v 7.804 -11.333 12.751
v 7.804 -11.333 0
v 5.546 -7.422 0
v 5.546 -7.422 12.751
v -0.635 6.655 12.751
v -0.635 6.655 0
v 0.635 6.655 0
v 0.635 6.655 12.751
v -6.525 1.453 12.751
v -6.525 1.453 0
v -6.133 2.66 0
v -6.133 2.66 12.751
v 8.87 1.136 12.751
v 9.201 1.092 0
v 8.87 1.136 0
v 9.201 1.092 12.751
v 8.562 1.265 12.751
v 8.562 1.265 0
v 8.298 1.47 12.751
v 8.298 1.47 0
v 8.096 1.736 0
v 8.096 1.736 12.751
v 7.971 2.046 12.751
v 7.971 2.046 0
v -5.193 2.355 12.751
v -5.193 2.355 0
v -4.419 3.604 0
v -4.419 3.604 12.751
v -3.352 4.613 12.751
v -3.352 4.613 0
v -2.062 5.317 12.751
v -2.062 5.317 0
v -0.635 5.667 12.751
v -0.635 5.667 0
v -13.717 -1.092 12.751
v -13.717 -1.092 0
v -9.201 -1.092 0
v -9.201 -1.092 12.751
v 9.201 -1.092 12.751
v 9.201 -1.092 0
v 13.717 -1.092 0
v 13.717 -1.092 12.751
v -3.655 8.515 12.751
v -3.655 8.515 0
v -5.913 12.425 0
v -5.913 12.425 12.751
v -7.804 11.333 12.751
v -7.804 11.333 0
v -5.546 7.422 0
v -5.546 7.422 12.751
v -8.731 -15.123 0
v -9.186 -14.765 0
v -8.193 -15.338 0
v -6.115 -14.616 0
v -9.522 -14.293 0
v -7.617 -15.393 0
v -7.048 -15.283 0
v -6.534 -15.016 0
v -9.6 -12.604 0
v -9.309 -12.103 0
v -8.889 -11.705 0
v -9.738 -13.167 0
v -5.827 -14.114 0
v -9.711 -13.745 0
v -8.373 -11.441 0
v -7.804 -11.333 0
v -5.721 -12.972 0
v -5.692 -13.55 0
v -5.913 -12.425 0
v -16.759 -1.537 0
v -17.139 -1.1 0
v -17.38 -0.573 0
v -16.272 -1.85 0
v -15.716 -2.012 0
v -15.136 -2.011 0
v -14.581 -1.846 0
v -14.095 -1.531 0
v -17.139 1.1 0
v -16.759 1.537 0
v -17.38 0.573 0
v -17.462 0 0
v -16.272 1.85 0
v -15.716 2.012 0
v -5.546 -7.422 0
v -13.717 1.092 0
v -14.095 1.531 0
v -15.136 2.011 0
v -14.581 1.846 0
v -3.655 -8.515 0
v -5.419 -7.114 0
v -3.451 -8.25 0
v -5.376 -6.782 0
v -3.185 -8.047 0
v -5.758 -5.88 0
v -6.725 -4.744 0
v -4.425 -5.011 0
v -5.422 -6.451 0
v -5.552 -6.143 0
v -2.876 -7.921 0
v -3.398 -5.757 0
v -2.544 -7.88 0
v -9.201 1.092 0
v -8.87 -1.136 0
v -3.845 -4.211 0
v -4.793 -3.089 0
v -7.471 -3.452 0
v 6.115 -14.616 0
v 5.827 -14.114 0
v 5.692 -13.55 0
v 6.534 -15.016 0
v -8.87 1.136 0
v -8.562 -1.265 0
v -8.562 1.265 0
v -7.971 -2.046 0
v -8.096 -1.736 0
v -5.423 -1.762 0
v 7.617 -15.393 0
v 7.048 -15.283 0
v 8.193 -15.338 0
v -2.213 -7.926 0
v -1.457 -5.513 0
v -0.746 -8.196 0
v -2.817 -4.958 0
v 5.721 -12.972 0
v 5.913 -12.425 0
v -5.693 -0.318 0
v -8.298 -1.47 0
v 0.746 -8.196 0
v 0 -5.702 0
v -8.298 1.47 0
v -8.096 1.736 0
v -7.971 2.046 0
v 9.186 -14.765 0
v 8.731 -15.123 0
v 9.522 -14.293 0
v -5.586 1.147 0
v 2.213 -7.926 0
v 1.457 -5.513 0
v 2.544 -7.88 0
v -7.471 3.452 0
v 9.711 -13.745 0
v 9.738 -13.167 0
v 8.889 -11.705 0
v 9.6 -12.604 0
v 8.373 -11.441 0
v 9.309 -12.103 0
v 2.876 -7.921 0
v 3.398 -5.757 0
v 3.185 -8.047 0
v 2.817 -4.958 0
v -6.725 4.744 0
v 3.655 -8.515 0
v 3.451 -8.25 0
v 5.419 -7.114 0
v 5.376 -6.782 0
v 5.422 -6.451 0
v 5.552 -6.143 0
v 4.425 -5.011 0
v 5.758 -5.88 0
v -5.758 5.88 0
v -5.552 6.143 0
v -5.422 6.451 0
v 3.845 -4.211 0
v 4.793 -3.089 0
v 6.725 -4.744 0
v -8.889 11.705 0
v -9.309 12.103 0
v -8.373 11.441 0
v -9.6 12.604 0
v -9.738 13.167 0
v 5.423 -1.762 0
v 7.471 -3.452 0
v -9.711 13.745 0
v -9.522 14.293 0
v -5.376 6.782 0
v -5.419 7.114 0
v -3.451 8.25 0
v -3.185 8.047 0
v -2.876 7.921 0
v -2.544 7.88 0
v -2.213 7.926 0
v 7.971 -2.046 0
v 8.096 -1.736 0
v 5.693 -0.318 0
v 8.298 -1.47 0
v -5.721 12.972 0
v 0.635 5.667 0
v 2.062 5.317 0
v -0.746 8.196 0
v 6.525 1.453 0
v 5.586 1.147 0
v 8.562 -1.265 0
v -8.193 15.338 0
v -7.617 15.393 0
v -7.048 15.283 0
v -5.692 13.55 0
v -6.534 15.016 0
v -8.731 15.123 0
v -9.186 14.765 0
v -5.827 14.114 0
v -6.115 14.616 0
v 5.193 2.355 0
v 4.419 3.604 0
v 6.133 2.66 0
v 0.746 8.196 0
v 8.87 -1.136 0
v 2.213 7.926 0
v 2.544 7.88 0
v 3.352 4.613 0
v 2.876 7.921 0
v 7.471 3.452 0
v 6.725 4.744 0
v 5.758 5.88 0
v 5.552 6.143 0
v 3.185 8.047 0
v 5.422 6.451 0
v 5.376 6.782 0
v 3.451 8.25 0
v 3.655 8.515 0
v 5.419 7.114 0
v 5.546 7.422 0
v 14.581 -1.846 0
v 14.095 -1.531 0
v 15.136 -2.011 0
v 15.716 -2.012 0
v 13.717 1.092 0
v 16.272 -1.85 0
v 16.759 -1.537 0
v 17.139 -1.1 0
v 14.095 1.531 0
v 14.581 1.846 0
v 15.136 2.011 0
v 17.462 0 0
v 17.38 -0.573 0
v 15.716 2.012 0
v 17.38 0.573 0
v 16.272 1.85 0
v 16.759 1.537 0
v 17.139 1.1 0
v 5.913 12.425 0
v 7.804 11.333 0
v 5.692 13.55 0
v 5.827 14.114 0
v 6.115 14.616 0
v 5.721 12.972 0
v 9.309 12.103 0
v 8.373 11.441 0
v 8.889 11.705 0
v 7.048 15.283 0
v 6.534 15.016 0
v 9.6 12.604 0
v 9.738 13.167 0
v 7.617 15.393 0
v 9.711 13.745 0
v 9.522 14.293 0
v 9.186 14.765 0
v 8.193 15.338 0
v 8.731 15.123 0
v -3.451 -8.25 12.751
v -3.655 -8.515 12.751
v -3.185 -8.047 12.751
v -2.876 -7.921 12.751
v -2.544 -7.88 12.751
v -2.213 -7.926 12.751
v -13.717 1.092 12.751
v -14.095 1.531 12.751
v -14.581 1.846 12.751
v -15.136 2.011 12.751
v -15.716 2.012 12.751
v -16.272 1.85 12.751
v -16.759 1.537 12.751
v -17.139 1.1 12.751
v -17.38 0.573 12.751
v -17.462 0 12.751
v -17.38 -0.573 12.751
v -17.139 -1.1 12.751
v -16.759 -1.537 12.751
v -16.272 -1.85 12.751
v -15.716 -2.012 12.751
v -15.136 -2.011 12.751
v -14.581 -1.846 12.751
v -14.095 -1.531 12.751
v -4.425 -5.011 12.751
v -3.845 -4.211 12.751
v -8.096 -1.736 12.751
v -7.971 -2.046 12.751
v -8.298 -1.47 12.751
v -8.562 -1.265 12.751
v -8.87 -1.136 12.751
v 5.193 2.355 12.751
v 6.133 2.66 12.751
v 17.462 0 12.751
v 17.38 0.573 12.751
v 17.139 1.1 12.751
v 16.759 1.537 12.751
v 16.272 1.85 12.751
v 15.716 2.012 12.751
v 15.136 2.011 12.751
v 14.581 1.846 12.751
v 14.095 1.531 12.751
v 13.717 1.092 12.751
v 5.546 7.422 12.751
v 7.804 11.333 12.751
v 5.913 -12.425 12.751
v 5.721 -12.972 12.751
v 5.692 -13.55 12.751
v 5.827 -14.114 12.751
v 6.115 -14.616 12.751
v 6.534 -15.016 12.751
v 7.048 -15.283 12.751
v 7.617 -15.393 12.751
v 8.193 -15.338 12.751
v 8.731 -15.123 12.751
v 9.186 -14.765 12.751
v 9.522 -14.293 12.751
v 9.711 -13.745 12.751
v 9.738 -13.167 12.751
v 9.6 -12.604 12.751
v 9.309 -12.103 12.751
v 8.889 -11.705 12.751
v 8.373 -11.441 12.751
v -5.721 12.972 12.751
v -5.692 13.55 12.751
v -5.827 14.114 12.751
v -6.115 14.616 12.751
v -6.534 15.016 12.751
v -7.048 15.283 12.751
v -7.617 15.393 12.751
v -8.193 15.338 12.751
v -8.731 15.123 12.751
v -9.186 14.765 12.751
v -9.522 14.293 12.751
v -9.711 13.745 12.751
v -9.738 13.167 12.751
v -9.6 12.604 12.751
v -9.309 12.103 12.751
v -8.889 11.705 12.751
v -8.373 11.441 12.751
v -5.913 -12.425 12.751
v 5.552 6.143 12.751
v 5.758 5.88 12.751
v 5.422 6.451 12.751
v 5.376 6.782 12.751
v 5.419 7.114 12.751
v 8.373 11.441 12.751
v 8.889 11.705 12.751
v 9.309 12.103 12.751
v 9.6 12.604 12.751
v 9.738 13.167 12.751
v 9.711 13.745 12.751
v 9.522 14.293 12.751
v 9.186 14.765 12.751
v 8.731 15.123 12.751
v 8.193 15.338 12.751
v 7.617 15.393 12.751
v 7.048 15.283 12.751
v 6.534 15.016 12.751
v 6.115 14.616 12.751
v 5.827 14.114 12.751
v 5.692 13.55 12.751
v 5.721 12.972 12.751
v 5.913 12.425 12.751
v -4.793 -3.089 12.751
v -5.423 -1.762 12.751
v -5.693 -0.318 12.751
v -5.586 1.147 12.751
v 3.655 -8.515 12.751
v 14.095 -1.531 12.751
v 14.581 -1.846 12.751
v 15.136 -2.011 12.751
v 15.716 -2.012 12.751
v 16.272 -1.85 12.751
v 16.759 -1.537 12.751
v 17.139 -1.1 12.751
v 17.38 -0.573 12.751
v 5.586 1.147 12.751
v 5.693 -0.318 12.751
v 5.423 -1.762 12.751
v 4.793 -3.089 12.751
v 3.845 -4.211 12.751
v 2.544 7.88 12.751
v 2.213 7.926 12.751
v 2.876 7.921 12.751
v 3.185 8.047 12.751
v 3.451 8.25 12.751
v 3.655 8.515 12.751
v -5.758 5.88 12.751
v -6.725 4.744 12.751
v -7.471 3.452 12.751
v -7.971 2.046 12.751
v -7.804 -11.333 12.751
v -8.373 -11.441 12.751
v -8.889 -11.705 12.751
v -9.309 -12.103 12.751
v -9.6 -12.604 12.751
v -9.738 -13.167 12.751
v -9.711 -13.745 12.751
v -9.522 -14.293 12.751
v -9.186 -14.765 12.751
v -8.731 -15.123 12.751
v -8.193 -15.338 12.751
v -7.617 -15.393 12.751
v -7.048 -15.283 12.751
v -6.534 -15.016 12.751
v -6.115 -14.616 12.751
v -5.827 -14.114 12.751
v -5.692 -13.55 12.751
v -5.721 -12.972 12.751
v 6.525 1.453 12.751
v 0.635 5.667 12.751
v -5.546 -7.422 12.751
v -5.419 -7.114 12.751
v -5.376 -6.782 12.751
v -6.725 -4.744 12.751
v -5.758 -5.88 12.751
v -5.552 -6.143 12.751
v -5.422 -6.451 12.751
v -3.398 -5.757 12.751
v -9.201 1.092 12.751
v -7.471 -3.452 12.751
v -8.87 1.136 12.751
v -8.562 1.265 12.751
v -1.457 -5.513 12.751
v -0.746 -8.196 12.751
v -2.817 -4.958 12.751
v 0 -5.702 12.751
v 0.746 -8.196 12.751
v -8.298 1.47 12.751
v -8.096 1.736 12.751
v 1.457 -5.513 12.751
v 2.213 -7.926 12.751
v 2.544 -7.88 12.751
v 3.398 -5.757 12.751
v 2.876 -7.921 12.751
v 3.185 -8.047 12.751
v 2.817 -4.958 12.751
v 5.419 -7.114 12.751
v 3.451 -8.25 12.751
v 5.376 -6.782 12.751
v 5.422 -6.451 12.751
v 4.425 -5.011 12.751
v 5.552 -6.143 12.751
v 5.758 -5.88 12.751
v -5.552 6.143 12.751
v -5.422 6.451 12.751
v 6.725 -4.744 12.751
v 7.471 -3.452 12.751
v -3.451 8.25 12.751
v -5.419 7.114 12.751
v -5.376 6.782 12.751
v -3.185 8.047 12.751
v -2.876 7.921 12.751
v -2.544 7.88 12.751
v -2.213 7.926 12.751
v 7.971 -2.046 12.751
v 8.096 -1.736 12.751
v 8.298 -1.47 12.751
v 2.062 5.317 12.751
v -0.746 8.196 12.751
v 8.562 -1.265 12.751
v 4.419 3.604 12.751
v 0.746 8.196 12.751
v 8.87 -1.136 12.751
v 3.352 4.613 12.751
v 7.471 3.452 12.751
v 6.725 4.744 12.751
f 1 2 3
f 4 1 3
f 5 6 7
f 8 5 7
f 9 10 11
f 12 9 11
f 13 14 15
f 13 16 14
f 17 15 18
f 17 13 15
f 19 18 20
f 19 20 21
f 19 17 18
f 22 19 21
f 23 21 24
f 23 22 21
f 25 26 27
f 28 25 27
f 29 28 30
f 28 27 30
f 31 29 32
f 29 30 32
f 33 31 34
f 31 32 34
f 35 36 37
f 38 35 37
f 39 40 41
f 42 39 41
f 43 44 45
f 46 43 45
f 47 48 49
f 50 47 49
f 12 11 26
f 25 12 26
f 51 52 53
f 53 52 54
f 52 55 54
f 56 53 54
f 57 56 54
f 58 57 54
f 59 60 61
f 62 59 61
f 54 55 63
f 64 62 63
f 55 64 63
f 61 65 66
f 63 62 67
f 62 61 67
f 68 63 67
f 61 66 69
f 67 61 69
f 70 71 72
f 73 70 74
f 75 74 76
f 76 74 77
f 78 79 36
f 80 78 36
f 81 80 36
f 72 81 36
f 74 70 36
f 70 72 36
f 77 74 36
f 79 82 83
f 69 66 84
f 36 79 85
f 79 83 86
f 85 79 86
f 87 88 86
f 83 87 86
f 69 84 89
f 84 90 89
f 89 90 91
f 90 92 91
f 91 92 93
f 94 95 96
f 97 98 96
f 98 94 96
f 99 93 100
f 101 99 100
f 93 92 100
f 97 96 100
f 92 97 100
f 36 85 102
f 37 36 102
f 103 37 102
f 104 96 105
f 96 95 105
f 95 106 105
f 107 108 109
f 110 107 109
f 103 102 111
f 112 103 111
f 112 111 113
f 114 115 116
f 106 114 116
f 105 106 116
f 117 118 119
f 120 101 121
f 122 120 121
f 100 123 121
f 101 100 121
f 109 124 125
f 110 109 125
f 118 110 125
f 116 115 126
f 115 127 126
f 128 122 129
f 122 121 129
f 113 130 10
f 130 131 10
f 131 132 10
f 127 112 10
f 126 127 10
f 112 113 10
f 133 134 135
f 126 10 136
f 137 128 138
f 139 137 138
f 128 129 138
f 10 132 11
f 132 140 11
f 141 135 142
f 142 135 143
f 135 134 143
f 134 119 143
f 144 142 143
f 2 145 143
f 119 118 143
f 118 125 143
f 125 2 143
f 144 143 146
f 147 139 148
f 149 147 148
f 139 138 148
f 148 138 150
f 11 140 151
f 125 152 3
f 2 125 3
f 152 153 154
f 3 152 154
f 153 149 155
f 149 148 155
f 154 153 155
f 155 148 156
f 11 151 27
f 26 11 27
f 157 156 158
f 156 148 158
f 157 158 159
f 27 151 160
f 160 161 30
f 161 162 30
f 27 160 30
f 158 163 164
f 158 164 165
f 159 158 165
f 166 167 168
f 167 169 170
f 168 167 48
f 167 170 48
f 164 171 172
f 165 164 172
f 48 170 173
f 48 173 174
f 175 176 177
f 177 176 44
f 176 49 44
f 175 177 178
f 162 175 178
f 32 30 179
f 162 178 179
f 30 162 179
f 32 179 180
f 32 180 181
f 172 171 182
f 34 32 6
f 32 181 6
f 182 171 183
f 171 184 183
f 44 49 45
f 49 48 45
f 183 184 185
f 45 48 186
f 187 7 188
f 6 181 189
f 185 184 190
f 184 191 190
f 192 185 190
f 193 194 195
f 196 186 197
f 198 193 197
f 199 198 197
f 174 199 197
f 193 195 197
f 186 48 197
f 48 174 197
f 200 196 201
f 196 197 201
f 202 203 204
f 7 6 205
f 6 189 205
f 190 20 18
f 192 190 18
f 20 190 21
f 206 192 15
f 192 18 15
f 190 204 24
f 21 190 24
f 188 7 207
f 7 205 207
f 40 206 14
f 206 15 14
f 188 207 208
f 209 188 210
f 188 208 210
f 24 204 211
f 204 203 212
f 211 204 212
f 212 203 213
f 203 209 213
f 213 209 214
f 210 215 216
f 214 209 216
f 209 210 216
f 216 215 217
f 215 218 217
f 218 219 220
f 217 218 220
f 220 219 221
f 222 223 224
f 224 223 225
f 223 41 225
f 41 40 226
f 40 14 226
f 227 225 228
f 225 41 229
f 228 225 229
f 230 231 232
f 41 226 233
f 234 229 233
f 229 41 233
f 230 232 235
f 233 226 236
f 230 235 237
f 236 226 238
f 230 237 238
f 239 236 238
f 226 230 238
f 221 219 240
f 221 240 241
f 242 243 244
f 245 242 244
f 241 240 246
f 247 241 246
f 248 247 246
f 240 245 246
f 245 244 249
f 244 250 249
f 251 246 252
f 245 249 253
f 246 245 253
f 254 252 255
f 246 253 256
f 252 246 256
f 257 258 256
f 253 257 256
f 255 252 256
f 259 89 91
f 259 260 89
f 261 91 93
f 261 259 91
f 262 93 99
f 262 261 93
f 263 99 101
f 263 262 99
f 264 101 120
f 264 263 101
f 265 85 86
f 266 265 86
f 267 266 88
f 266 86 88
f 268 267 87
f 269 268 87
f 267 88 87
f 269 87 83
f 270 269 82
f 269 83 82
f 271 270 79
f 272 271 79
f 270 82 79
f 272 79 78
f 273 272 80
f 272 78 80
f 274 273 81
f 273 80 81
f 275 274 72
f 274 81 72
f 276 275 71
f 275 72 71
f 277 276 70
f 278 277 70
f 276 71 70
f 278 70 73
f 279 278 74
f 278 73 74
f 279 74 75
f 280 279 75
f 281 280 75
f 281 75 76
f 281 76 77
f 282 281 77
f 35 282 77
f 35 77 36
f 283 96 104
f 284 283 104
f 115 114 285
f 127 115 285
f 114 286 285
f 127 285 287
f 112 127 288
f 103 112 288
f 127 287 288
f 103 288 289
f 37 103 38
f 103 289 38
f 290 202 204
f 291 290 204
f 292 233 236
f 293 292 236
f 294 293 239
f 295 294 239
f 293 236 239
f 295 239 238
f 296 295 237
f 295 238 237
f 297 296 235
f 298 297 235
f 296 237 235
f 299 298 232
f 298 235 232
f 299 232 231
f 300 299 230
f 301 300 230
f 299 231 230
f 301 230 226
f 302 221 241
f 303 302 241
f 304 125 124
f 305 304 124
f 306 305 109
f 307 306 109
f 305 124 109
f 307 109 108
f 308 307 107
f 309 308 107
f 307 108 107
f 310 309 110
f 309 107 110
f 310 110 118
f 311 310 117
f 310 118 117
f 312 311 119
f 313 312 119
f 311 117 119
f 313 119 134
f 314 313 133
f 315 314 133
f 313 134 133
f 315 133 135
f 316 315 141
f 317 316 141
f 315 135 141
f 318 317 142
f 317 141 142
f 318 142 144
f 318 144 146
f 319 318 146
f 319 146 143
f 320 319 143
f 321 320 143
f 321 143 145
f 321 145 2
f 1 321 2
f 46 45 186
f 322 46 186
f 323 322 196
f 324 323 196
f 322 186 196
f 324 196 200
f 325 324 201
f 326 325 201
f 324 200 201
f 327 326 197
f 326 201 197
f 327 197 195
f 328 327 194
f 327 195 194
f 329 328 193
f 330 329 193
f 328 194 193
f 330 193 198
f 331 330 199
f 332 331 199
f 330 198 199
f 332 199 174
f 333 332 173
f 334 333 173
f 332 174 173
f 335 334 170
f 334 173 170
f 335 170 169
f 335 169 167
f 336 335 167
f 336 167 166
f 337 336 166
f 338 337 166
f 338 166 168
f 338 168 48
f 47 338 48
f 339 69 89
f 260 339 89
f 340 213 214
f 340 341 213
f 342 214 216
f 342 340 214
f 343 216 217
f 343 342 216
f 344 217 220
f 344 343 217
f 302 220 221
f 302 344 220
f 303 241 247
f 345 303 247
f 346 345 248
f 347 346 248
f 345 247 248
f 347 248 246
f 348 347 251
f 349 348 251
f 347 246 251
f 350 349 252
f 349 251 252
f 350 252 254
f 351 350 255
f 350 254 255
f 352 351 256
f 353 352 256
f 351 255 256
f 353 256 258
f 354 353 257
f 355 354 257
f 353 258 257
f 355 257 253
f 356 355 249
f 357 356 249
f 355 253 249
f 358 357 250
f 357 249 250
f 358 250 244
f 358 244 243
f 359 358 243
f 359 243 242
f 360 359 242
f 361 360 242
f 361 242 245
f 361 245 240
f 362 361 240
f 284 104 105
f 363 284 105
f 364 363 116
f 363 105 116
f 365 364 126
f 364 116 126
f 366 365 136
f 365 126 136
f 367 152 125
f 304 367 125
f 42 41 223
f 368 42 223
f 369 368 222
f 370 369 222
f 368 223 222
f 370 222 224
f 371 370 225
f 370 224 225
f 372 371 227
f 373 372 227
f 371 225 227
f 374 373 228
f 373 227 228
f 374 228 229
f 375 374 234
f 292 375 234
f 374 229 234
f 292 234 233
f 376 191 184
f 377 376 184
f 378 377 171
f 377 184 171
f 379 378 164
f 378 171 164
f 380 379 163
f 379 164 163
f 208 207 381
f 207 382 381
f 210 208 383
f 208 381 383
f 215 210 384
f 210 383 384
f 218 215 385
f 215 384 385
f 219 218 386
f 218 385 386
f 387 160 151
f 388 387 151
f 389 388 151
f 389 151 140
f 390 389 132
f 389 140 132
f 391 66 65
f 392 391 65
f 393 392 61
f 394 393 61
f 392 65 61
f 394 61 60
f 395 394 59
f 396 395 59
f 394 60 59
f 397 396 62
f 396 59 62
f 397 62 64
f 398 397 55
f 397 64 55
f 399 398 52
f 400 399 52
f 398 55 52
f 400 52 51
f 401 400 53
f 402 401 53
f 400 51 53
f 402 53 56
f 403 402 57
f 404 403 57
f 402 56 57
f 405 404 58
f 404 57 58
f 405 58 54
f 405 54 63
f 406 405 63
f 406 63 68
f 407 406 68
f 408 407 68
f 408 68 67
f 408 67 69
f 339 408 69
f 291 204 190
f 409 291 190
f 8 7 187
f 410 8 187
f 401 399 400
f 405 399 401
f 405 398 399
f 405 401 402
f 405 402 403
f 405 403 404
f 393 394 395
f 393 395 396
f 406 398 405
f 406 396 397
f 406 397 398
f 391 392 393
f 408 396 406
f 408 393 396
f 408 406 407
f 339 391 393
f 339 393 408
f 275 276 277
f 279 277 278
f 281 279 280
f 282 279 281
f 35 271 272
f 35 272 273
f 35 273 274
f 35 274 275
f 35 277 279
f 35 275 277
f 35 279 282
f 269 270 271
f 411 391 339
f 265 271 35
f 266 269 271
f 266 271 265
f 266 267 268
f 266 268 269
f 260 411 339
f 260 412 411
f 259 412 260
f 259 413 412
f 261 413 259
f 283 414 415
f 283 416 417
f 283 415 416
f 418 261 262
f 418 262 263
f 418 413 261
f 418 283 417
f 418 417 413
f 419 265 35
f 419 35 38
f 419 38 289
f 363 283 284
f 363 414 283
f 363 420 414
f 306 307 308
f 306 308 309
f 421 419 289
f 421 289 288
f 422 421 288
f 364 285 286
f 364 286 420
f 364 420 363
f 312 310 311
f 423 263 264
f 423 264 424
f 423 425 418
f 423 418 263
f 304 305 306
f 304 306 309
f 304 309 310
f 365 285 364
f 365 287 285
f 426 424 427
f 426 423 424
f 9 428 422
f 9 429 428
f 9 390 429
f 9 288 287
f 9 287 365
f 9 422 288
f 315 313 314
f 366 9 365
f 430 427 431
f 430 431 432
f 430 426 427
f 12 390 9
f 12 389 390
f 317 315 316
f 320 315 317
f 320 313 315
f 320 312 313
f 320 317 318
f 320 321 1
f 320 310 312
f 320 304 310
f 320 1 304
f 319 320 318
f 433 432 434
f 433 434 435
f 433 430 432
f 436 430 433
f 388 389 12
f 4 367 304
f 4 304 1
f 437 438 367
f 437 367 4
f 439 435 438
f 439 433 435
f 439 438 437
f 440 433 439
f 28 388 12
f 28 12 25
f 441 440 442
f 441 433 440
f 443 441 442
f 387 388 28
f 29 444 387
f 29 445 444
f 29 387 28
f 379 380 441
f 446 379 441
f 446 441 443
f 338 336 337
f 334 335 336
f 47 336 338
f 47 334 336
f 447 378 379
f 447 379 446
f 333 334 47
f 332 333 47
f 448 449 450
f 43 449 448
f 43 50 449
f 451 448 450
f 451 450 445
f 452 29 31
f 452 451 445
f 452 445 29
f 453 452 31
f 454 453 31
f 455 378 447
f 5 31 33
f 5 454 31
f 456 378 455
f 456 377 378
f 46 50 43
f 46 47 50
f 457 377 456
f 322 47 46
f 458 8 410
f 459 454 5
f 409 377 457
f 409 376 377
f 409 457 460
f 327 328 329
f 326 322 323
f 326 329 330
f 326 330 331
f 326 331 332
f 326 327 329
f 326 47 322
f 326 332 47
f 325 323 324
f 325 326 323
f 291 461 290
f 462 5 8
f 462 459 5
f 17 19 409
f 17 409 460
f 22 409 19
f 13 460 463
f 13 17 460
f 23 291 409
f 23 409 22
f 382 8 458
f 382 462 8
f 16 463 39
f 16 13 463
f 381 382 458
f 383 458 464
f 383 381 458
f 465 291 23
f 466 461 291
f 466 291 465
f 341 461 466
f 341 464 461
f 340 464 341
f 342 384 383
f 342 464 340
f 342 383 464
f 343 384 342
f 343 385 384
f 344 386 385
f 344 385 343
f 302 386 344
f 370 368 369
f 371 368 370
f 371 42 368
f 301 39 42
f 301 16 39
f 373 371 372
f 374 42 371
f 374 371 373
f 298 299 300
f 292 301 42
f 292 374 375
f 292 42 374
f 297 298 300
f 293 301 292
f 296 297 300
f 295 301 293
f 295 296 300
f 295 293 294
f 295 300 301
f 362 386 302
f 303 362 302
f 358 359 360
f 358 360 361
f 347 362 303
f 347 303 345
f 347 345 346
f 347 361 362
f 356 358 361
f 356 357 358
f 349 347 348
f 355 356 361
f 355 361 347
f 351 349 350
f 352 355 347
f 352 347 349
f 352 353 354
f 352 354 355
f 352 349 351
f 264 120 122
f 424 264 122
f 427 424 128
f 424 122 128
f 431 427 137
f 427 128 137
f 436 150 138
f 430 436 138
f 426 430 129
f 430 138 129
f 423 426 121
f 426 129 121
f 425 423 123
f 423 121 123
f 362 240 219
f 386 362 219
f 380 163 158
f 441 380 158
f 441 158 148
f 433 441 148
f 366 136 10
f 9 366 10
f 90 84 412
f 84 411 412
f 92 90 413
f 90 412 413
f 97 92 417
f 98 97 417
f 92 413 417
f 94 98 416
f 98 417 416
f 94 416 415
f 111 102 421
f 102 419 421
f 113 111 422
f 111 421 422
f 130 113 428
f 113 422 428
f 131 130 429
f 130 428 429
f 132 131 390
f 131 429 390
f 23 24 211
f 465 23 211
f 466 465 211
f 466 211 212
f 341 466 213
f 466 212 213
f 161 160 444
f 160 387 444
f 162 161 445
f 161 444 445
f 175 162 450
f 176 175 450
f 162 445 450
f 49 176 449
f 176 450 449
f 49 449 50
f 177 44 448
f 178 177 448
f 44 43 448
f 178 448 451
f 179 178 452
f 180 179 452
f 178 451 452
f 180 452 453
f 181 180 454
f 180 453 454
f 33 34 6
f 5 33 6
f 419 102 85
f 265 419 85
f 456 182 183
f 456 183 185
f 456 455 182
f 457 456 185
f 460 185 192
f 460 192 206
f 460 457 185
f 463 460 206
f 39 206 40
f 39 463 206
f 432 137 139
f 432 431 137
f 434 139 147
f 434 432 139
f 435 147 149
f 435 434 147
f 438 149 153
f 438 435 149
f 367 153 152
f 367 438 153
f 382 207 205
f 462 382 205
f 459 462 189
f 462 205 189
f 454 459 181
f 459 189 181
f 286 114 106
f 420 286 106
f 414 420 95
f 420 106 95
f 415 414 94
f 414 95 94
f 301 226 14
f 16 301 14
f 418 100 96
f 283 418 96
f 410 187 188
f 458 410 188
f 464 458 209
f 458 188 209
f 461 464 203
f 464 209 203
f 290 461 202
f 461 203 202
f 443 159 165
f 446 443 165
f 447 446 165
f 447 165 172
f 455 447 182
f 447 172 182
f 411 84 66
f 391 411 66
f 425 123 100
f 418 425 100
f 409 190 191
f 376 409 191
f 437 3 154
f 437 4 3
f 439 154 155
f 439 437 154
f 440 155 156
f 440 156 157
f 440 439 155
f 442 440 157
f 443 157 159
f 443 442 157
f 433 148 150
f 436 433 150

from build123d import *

# Parameters (mm, degrees)
F1_DEPTH = 12.7508
F2_R     = 1.27


with BuildPart() as f1:
    # F0 (on Top) → F1 (new body)
    with BuildSketch(Plane.XY):
        with BuildLine():
            Line((-5.912621, -12.42536), (-3.132528, -7.610098))
            ThreePointArc((-3.132528, -7.610098), (0, -8.2296), (3.132528, -7.610098))
            Line((3.132528, -7.610098), (5.912621, -12.42536))
            ThreePointArc((5.912621, -12.42536), (8.73125, -15.122969), (7.804367, -11.33316))
            Line((7.804367, -11.33316), (5.024274, -6.517898))
            ThreePointArc((5.024274, -6.517898), (7.127043, -4.1148), (8.156802, -1.0922))
            Line((8.156802, -1.0922), (13.716988, -1.0922))
            ThreePointArc((13.716988, -1.0922), (15.999344, -1.950754), (17.4625, 0))
            ThreePointArc((17.4625, 0), (15.999344, 1.950754), (13.716988, 1.0922))
            Line((13.716988, 1.0922), (8.156802, 1.0922))
            ThreePointArc((8.156802, 1.0922), (7.127043, 4.1148), (5.024274, 6.517898))
            Line((5.024274, 6.517898), (7.804367, 11.33316))
            ThreePointArc((7.804367, 11.33316), (8.73125, 15.122969), (5.912621, 12.42536))
            Line((5.912621, 12.42536), (3.132528, 7.610098))
            ThreePointArc((3.132528, 7.610098), (0, 8.2296), (-3.132528, 7.610098))
            Line((-3.132528, 7.610098), (-5.912621, 12.42536))
            ThreePointArc((-5.912621, 12.42536), (-8.73125, 15.122969), (-7.804367, 11.33316))
            Line((-7.804367, 11.33316), (-5.024274, 6.517898))
            ThreePointArc((-5.024274, 6.517898), (-7.127043, 4.1148), (-8.156802, 1.0922))
            Line((-8.156802, 1.0922), (-13.716988, 1.0922))
            ThreePointArc((-13.716988, 1.0922), (-17.4625, 0), (-13.716988, -1.0922))
            Line((-13.716988, -1.0922), (-8.156802, -1.0922))
            ThreePointArc((-8.156802, -1.0922), (-7.127043, -4.1148), (-5.024274, -6.517898))
            Line((-5.024274, -6.517898), (-7.804367, -11.33316))
            ThreePointArc((-7.804367, -11.33316), (-8.73125, -15.122969), (-5.912621, -12.42536))
        make_face()
        with BuildLine():
            ThreePointArc((-5.193253, 2.355069), (-3.351728, 4.613258), (-0.635, 5.666833))
            Line((-0.635, 5.666833), (-0.635, 6.6548))
            Line((-0.635, 6.6548), (0.635, 6.6548))
            Line((0.635, 6.6548), (0.635, 5.666833))
            ThreePointArc((0.635, 5.666833), (3.351728, 4.613258), (5.193253, 2.355069))
            Line((5.193253, 2.355069), (6.132865, 2.660367))
            Line((6.132865, 2.660367), (6.525317, 1.452525))
            Line((6.525317, 1.452525), (5.585705, 1.147227))
            ThreePointArc((5.585705, 1.147227), (5.42321, -1.762108), (3.844607, -4.211321))
            Line((3.844607, -4.211321), (4.425319, -5.010603))
            Line((4.425319, -5.010603), (3.397868, -5.75709))
            Line((3.397868, -5.75709), (2.817155, -4.957808))
            ThreePointArc((2.817155, -4.957808), (0, -5.7023), (-2.817155, -4.957808))
            Line((-2.817155, -4.957808), (-3.397868, -5.75709))
            Line((-3.397868, -5.75709), (-4.425319, -5.010603))
            Line((-4.425319, -5.010603), (-3.844607, -4.211321))
            ThreePointArc((-3.844607, -4.211321), (-5.42321, -1.762108), (-5.585705, 1.147227))
            Line((-5.585705, 1.147227), (-6.525317, 1.452525))
            Line((-6.525317, 1.452525), (-6.132865, 2.660367))
            Line((-6.132865, 2.660367), (-5.193253, 2.355069))
        make_face(mode=Mode.SUBTRACT)
    extrude(amount=F1_DEPTH)

    # F2
    f2_edges = [f1.edges().sort_by_distance(p)[0] for p in [
        (-3.132528, 7.610098, 6.3754),
        (5.024274, 6.517898, 6.3754),
        (8.156802, 1.0922, 6.3754),
        (3.132528, 7.610098, 6.3754),
        (-5.024274, 6.517898, 6.3754),
        (-8.156802, 1.0922, 6.3754),
        (-5.024274, -6.517898, 6.3754),
        (-8.156802, -1.0922, 6.3754),
        (-3.132528, -7.610098, 6.3754),
        (3.132528, -7.610098, 6.3754),
        (5.024274, -6.517898, 6.3754),
        (8.156802, -1.0922, 6.3754),
    ]]
    fillet(f2_edges, radius=F2_R)


solid = f1.part
